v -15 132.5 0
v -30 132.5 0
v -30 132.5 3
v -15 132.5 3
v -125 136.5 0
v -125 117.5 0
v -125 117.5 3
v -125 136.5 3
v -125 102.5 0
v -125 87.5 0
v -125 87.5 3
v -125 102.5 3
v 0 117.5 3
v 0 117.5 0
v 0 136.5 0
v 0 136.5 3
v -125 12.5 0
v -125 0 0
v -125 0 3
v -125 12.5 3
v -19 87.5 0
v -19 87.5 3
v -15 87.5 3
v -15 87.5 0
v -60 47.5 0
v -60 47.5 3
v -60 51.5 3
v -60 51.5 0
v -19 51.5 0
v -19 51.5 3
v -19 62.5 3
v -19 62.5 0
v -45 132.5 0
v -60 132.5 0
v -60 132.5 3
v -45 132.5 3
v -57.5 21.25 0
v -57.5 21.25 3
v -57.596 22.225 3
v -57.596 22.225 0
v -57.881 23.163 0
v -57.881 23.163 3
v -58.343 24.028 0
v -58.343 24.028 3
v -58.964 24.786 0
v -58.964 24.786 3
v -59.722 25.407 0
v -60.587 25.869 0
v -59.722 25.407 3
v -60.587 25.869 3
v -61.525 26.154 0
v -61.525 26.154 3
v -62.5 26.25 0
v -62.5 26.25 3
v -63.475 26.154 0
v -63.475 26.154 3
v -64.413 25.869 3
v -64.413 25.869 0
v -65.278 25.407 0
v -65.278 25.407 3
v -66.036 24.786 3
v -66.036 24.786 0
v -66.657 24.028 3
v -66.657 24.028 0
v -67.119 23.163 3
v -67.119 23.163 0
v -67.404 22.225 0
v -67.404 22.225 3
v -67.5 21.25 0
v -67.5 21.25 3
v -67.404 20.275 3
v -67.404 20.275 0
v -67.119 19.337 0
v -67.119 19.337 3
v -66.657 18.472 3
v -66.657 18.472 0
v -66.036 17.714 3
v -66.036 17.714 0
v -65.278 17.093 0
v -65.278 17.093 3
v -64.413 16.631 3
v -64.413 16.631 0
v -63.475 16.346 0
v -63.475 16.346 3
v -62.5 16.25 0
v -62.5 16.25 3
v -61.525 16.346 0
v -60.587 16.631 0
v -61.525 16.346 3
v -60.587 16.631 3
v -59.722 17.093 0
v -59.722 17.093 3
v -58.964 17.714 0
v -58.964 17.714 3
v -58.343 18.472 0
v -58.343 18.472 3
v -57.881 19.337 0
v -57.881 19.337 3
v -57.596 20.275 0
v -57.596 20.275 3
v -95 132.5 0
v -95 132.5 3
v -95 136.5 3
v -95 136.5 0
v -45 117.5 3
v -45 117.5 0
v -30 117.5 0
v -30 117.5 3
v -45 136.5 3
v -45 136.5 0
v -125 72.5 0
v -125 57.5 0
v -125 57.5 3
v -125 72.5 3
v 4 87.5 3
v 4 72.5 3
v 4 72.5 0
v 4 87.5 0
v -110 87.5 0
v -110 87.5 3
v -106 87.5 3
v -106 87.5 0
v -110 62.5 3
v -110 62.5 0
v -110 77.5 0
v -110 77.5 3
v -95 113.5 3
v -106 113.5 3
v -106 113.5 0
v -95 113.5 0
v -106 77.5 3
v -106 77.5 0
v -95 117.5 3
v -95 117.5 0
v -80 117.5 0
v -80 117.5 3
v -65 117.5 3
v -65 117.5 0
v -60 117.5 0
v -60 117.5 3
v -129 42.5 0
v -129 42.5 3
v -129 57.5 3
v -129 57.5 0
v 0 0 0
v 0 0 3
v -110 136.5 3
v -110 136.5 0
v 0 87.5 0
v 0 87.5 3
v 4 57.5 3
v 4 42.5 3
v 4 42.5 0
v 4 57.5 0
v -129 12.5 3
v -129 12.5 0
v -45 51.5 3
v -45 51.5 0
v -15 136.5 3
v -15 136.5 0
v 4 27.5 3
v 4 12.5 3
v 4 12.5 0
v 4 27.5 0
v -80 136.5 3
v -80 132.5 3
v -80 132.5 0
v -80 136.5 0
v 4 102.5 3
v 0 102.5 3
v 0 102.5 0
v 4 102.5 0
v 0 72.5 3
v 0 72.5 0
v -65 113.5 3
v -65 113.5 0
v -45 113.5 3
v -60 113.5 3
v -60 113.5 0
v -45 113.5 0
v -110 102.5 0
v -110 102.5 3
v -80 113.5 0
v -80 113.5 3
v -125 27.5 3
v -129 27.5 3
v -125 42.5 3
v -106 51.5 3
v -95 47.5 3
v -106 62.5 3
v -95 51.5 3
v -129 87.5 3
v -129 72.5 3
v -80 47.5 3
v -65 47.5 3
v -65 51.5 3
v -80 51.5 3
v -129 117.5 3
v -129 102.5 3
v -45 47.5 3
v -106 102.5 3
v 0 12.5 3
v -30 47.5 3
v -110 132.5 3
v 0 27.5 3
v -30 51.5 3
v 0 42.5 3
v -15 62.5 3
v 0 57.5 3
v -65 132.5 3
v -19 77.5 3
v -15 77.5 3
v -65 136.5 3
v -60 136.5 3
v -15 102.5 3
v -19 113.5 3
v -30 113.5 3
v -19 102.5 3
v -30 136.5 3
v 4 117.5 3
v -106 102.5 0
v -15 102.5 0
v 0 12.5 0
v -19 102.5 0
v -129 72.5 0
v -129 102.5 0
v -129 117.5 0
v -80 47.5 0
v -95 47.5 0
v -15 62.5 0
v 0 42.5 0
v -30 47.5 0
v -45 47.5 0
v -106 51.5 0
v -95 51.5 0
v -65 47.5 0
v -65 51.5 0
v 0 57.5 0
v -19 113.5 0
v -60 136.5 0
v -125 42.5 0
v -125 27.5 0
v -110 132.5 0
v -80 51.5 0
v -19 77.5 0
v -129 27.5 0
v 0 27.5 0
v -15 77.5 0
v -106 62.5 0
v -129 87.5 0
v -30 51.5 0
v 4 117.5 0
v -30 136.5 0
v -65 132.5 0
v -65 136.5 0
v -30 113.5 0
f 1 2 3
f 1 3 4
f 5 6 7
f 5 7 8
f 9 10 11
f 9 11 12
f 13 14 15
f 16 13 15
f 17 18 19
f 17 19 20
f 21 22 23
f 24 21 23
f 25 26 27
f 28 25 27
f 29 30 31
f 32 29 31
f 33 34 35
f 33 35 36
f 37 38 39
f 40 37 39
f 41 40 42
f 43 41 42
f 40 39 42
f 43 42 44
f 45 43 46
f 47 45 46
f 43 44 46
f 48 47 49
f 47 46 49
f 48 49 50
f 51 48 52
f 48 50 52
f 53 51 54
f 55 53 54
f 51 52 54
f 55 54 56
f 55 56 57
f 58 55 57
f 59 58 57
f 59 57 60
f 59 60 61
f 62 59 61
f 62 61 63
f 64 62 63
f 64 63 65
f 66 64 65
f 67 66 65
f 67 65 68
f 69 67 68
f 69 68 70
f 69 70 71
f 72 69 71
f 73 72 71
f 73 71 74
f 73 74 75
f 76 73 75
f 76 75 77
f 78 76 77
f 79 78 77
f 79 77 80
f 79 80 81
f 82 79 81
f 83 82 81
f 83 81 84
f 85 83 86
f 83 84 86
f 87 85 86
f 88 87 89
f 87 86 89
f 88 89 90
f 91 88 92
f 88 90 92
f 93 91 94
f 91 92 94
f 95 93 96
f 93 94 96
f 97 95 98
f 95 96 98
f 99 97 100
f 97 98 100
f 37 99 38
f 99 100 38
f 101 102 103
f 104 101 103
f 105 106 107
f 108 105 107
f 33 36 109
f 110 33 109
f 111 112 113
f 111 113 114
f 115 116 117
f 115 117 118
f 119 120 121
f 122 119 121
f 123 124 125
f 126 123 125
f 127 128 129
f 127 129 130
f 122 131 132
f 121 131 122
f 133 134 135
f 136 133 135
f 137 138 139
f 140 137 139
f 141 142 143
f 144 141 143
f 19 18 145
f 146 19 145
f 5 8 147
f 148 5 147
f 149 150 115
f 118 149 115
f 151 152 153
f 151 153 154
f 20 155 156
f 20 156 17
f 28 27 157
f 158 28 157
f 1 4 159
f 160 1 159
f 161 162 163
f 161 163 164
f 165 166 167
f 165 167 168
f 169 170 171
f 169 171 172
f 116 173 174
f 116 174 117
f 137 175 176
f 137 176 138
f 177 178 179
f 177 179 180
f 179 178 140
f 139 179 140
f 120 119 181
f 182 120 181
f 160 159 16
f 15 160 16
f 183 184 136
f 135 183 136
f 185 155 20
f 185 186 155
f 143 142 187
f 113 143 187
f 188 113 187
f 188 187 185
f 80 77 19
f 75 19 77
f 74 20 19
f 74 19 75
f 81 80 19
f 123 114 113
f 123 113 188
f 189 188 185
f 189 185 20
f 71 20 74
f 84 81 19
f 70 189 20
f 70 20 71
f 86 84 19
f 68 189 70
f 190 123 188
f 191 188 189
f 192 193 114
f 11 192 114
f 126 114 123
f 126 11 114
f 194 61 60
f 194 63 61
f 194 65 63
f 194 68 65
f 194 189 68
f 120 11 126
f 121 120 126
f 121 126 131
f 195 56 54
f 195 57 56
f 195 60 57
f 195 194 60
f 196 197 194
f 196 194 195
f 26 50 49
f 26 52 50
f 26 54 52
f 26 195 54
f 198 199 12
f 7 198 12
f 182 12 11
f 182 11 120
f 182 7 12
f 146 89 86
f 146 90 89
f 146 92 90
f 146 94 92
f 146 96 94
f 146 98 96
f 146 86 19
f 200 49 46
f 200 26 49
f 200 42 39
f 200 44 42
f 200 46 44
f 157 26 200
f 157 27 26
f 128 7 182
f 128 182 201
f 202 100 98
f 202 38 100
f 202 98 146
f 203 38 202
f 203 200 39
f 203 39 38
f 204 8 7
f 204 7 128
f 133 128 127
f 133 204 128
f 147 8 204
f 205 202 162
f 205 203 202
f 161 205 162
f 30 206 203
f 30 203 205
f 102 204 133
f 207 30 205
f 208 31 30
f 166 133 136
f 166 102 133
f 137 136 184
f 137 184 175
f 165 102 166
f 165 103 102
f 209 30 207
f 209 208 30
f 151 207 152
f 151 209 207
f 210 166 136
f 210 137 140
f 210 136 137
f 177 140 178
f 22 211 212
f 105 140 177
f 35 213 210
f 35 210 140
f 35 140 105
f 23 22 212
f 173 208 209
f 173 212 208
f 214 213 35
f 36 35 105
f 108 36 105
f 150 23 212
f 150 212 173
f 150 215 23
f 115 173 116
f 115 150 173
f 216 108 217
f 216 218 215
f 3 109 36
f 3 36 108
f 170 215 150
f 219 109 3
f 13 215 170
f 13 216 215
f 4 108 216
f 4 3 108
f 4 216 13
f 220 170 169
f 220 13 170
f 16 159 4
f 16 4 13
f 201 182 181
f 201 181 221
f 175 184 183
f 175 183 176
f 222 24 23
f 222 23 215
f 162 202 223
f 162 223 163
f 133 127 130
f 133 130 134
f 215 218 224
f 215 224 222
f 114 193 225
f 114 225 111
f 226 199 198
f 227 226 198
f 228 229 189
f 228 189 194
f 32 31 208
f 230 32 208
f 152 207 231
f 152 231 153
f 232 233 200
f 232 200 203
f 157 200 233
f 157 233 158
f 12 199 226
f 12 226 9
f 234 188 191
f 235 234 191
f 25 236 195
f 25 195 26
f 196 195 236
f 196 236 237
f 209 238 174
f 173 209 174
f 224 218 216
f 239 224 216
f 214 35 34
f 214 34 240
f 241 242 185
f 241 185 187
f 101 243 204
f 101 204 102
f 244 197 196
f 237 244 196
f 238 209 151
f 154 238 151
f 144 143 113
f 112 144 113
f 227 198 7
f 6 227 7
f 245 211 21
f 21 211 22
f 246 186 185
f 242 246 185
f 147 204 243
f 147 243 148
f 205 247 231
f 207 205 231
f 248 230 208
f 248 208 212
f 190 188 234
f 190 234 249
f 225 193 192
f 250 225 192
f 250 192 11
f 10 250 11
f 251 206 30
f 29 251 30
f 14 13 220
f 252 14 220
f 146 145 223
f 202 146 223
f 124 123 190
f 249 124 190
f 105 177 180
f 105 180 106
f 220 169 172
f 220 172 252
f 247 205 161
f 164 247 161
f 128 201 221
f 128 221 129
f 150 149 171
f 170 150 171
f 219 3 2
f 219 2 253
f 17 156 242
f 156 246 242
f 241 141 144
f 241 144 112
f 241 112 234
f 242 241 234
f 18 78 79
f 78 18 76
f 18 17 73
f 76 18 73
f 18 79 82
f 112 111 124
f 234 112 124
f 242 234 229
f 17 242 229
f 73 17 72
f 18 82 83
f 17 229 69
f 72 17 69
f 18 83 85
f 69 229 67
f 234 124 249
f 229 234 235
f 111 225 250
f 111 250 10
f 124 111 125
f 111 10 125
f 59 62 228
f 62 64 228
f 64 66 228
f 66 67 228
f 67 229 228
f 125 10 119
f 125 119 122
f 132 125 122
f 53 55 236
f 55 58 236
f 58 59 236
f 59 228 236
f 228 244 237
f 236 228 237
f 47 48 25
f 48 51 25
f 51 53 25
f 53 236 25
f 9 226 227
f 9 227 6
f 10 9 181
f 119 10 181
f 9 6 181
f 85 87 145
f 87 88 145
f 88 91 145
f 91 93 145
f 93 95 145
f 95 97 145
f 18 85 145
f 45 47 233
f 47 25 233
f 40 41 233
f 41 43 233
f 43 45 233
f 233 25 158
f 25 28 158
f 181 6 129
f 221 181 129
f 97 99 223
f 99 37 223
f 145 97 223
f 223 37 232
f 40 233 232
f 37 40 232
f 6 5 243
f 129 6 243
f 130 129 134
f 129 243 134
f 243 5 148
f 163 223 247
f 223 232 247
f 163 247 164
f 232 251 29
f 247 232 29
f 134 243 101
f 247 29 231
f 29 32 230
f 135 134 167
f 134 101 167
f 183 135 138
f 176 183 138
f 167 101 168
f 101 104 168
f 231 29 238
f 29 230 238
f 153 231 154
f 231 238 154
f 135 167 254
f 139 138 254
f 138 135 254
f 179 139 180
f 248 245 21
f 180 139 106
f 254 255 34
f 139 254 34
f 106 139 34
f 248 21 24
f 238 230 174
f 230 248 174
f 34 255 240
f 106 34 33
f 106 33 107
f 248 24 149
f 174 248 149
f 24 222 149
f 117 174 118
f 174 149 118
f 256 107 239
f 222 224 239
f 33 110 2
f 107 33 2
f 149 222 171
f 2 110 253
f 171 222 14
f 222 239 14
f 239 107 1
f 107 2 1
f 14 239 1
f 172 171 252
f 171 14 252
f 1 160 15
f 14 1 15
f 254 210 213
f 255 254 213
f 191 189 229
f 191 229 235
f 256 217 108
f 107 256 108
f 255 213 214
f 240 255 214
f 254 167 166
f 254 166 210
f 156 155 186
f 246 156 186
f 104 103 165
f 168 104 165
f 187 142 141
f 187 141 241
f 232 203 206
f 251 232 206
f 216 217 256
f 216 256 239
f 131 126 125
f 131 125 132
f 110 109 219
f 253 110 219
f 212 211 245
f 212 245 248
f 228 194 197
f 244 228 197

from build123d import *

# Parameters (mm, degrees)
SKETCH1_W           = 125
SKETCH1_H           = 132.5
SKETCH1_W_2         = 95
SKETCH1_H_2         = 70
BOSS_EXTRUDE1_DEPTH = 3
SKETCH2_R           = 5
CUT_EXTRUDE1_DEPTH  = 10
SKETCH3_W           = 5
SKETCH3_H           = 4
SKETCH3_W_2         = 4
SKETCH3_H_2         = 15
SKETCH3_W_3         = 15
BOSS_EXTRUDE2_DEPTH = 3
SKETCH4_W           = 4
SKETCH4_H           = 10
SKETCH4_H_2         = 11
BOSS_EXTRUDE3_DEPTH = 3


with BuildPart() as part:
    # Sketch1 → Boss-Extrude1 (new body)
    with BuildSketch(Plane.XY):
        with Locations((-62.5, 66.25)):
            Rectangle(SKETCH1_W, SKETCH1_H)
        with Locations((-62.5, 82.5)):
            Rectangle(SKETCH1_W_2, SKETCH1_H_2, mode=Mode.SUBTRACT)
    extrude(amount=BOSS_EXTRUDE1_DEPTH)

    # Sketch2 → Cut-Extrude1 (cut)
    with BuildSketch(Plane.XY.offset(3)):
        with Locations((-62.5, 21.25)):
            Circle(SKETCH2_R)
    extrude(amount=-CUT_EXTRUDE1_DEPTH, mode=Mode.SUBTRACT)

    # Sketch3 → Boss-Extrude2 (add)
    with BuildSketch(Plane.XY.offset(3)):
        with Locations((-62.5, 134.5)):
            Rectangle(SKETCH3_W, SKETCH3_H)
        with Locations((2, 20)):
            Rectangle(SKETCH3_W_2, SKETCH3_H_2)
        with Locations((2, 110)):
            Rectangle(SKETCH3_W_2, SKETCH3_H_2)
        with Locations((2, 80)):
            Rectangle(SKETCH3_W_2, SKETCH3_H_2)
        with Locations((2, 50)):
            Rectangle(SKETCH3_W_2, SKETCH3_H_2)
        with Locations((-102.5, 115.5)):
            Rectangle(SKETCH3_W_3, SKETCH3_H)
        with Locations((-127, 80)):
            Rectangle(SKETCH3_W_2, SKETCH3_H_2)
        with Locations((-127, 110)):
            Rectangle(SKETCH3_W_2, SKETCH3_H_2)
        with Locations((-127, 50)):
            Rectangle(SKETCH3_W_2, SKETCH3_H_2)
        with Locations((-127, 20)):
            Rectangle(SKETCH3_W_2, SKETCH3_H_2)
        with Locations((-117.5, 134.5)):
            Rectangle(SKETCH3_W_3, SKETCH3_H)
        with Locations((-7.5, 134.5)):
            Rectangle(SKETCH3_W_3, SKETCH3_H)
        with Locations((-37.5, 134.5)):
            Rectangle(SKETCH3_W_3, SKETCH3_H)
        with Locations((-87.5, 134.5)):
            Rectangle(SKETCH3_W_3, SKETCH3_H)
        with Locations((-22.5, 115.5)):
            Rectangle(SKETCH3_W_3, SKETCH3_H)
        with Locations((-72.5, 115.5)):
            Rectangle(SKETCH3_W_3, SKETCH3_H)
        with Locations((-52.5, 115.5)):
            Rectangle(SKETCH3_W_3, SKETCH3_H)
        with Locations((-52.5, 49.5)):
            Rectangle(SKETCH3_W_3, SKETCH3_H)
        with Locations((-22.5, 49.5)):
            Rectangle(SKETCH3_W_3, SKETCH3_H)
        with Locations((-72.5, 49.5)):
            Rectangle(SKETCH3_W_3, SKETCH3_H)
        with Locations((-102.5, 49.5)):
            Rectangle(SKETCH3_W_3, SKETCH3_H)
    extrude(amount=-BOSS_EXTRUDE2_DEPTH)

    # Sketch4 → Boss-Extrude3 (add)
    with BuildSketch(Plane.XY.offset(3)):
        with Locations((-108, 82.5)):
            Rectangle(SKETCH4_W, SKETCH4_H)
        with Locations((-108, 108)):
            Rectangle(SKETCH4_W, SKETCH4_H_2)
        with Locations((-108, 57)):
            Rectangle(SKETCH4_W, SKETCH4_H_2)
        with Locations((-17, 57)):
            Rectangle(SKETCH4_W, SKETCH4_H_2)
        with Locations((-17, 82.5)):
            Rectangle(SKETCH4_W, SKETCH4_H)
        with Locations((-17, 108)):
            Rectangle(SKETCH4_W, SKETCH4_H_2)
    extrude(amount=-BOSS_EXTRUDE3_DEPTH)


solid = part.part
